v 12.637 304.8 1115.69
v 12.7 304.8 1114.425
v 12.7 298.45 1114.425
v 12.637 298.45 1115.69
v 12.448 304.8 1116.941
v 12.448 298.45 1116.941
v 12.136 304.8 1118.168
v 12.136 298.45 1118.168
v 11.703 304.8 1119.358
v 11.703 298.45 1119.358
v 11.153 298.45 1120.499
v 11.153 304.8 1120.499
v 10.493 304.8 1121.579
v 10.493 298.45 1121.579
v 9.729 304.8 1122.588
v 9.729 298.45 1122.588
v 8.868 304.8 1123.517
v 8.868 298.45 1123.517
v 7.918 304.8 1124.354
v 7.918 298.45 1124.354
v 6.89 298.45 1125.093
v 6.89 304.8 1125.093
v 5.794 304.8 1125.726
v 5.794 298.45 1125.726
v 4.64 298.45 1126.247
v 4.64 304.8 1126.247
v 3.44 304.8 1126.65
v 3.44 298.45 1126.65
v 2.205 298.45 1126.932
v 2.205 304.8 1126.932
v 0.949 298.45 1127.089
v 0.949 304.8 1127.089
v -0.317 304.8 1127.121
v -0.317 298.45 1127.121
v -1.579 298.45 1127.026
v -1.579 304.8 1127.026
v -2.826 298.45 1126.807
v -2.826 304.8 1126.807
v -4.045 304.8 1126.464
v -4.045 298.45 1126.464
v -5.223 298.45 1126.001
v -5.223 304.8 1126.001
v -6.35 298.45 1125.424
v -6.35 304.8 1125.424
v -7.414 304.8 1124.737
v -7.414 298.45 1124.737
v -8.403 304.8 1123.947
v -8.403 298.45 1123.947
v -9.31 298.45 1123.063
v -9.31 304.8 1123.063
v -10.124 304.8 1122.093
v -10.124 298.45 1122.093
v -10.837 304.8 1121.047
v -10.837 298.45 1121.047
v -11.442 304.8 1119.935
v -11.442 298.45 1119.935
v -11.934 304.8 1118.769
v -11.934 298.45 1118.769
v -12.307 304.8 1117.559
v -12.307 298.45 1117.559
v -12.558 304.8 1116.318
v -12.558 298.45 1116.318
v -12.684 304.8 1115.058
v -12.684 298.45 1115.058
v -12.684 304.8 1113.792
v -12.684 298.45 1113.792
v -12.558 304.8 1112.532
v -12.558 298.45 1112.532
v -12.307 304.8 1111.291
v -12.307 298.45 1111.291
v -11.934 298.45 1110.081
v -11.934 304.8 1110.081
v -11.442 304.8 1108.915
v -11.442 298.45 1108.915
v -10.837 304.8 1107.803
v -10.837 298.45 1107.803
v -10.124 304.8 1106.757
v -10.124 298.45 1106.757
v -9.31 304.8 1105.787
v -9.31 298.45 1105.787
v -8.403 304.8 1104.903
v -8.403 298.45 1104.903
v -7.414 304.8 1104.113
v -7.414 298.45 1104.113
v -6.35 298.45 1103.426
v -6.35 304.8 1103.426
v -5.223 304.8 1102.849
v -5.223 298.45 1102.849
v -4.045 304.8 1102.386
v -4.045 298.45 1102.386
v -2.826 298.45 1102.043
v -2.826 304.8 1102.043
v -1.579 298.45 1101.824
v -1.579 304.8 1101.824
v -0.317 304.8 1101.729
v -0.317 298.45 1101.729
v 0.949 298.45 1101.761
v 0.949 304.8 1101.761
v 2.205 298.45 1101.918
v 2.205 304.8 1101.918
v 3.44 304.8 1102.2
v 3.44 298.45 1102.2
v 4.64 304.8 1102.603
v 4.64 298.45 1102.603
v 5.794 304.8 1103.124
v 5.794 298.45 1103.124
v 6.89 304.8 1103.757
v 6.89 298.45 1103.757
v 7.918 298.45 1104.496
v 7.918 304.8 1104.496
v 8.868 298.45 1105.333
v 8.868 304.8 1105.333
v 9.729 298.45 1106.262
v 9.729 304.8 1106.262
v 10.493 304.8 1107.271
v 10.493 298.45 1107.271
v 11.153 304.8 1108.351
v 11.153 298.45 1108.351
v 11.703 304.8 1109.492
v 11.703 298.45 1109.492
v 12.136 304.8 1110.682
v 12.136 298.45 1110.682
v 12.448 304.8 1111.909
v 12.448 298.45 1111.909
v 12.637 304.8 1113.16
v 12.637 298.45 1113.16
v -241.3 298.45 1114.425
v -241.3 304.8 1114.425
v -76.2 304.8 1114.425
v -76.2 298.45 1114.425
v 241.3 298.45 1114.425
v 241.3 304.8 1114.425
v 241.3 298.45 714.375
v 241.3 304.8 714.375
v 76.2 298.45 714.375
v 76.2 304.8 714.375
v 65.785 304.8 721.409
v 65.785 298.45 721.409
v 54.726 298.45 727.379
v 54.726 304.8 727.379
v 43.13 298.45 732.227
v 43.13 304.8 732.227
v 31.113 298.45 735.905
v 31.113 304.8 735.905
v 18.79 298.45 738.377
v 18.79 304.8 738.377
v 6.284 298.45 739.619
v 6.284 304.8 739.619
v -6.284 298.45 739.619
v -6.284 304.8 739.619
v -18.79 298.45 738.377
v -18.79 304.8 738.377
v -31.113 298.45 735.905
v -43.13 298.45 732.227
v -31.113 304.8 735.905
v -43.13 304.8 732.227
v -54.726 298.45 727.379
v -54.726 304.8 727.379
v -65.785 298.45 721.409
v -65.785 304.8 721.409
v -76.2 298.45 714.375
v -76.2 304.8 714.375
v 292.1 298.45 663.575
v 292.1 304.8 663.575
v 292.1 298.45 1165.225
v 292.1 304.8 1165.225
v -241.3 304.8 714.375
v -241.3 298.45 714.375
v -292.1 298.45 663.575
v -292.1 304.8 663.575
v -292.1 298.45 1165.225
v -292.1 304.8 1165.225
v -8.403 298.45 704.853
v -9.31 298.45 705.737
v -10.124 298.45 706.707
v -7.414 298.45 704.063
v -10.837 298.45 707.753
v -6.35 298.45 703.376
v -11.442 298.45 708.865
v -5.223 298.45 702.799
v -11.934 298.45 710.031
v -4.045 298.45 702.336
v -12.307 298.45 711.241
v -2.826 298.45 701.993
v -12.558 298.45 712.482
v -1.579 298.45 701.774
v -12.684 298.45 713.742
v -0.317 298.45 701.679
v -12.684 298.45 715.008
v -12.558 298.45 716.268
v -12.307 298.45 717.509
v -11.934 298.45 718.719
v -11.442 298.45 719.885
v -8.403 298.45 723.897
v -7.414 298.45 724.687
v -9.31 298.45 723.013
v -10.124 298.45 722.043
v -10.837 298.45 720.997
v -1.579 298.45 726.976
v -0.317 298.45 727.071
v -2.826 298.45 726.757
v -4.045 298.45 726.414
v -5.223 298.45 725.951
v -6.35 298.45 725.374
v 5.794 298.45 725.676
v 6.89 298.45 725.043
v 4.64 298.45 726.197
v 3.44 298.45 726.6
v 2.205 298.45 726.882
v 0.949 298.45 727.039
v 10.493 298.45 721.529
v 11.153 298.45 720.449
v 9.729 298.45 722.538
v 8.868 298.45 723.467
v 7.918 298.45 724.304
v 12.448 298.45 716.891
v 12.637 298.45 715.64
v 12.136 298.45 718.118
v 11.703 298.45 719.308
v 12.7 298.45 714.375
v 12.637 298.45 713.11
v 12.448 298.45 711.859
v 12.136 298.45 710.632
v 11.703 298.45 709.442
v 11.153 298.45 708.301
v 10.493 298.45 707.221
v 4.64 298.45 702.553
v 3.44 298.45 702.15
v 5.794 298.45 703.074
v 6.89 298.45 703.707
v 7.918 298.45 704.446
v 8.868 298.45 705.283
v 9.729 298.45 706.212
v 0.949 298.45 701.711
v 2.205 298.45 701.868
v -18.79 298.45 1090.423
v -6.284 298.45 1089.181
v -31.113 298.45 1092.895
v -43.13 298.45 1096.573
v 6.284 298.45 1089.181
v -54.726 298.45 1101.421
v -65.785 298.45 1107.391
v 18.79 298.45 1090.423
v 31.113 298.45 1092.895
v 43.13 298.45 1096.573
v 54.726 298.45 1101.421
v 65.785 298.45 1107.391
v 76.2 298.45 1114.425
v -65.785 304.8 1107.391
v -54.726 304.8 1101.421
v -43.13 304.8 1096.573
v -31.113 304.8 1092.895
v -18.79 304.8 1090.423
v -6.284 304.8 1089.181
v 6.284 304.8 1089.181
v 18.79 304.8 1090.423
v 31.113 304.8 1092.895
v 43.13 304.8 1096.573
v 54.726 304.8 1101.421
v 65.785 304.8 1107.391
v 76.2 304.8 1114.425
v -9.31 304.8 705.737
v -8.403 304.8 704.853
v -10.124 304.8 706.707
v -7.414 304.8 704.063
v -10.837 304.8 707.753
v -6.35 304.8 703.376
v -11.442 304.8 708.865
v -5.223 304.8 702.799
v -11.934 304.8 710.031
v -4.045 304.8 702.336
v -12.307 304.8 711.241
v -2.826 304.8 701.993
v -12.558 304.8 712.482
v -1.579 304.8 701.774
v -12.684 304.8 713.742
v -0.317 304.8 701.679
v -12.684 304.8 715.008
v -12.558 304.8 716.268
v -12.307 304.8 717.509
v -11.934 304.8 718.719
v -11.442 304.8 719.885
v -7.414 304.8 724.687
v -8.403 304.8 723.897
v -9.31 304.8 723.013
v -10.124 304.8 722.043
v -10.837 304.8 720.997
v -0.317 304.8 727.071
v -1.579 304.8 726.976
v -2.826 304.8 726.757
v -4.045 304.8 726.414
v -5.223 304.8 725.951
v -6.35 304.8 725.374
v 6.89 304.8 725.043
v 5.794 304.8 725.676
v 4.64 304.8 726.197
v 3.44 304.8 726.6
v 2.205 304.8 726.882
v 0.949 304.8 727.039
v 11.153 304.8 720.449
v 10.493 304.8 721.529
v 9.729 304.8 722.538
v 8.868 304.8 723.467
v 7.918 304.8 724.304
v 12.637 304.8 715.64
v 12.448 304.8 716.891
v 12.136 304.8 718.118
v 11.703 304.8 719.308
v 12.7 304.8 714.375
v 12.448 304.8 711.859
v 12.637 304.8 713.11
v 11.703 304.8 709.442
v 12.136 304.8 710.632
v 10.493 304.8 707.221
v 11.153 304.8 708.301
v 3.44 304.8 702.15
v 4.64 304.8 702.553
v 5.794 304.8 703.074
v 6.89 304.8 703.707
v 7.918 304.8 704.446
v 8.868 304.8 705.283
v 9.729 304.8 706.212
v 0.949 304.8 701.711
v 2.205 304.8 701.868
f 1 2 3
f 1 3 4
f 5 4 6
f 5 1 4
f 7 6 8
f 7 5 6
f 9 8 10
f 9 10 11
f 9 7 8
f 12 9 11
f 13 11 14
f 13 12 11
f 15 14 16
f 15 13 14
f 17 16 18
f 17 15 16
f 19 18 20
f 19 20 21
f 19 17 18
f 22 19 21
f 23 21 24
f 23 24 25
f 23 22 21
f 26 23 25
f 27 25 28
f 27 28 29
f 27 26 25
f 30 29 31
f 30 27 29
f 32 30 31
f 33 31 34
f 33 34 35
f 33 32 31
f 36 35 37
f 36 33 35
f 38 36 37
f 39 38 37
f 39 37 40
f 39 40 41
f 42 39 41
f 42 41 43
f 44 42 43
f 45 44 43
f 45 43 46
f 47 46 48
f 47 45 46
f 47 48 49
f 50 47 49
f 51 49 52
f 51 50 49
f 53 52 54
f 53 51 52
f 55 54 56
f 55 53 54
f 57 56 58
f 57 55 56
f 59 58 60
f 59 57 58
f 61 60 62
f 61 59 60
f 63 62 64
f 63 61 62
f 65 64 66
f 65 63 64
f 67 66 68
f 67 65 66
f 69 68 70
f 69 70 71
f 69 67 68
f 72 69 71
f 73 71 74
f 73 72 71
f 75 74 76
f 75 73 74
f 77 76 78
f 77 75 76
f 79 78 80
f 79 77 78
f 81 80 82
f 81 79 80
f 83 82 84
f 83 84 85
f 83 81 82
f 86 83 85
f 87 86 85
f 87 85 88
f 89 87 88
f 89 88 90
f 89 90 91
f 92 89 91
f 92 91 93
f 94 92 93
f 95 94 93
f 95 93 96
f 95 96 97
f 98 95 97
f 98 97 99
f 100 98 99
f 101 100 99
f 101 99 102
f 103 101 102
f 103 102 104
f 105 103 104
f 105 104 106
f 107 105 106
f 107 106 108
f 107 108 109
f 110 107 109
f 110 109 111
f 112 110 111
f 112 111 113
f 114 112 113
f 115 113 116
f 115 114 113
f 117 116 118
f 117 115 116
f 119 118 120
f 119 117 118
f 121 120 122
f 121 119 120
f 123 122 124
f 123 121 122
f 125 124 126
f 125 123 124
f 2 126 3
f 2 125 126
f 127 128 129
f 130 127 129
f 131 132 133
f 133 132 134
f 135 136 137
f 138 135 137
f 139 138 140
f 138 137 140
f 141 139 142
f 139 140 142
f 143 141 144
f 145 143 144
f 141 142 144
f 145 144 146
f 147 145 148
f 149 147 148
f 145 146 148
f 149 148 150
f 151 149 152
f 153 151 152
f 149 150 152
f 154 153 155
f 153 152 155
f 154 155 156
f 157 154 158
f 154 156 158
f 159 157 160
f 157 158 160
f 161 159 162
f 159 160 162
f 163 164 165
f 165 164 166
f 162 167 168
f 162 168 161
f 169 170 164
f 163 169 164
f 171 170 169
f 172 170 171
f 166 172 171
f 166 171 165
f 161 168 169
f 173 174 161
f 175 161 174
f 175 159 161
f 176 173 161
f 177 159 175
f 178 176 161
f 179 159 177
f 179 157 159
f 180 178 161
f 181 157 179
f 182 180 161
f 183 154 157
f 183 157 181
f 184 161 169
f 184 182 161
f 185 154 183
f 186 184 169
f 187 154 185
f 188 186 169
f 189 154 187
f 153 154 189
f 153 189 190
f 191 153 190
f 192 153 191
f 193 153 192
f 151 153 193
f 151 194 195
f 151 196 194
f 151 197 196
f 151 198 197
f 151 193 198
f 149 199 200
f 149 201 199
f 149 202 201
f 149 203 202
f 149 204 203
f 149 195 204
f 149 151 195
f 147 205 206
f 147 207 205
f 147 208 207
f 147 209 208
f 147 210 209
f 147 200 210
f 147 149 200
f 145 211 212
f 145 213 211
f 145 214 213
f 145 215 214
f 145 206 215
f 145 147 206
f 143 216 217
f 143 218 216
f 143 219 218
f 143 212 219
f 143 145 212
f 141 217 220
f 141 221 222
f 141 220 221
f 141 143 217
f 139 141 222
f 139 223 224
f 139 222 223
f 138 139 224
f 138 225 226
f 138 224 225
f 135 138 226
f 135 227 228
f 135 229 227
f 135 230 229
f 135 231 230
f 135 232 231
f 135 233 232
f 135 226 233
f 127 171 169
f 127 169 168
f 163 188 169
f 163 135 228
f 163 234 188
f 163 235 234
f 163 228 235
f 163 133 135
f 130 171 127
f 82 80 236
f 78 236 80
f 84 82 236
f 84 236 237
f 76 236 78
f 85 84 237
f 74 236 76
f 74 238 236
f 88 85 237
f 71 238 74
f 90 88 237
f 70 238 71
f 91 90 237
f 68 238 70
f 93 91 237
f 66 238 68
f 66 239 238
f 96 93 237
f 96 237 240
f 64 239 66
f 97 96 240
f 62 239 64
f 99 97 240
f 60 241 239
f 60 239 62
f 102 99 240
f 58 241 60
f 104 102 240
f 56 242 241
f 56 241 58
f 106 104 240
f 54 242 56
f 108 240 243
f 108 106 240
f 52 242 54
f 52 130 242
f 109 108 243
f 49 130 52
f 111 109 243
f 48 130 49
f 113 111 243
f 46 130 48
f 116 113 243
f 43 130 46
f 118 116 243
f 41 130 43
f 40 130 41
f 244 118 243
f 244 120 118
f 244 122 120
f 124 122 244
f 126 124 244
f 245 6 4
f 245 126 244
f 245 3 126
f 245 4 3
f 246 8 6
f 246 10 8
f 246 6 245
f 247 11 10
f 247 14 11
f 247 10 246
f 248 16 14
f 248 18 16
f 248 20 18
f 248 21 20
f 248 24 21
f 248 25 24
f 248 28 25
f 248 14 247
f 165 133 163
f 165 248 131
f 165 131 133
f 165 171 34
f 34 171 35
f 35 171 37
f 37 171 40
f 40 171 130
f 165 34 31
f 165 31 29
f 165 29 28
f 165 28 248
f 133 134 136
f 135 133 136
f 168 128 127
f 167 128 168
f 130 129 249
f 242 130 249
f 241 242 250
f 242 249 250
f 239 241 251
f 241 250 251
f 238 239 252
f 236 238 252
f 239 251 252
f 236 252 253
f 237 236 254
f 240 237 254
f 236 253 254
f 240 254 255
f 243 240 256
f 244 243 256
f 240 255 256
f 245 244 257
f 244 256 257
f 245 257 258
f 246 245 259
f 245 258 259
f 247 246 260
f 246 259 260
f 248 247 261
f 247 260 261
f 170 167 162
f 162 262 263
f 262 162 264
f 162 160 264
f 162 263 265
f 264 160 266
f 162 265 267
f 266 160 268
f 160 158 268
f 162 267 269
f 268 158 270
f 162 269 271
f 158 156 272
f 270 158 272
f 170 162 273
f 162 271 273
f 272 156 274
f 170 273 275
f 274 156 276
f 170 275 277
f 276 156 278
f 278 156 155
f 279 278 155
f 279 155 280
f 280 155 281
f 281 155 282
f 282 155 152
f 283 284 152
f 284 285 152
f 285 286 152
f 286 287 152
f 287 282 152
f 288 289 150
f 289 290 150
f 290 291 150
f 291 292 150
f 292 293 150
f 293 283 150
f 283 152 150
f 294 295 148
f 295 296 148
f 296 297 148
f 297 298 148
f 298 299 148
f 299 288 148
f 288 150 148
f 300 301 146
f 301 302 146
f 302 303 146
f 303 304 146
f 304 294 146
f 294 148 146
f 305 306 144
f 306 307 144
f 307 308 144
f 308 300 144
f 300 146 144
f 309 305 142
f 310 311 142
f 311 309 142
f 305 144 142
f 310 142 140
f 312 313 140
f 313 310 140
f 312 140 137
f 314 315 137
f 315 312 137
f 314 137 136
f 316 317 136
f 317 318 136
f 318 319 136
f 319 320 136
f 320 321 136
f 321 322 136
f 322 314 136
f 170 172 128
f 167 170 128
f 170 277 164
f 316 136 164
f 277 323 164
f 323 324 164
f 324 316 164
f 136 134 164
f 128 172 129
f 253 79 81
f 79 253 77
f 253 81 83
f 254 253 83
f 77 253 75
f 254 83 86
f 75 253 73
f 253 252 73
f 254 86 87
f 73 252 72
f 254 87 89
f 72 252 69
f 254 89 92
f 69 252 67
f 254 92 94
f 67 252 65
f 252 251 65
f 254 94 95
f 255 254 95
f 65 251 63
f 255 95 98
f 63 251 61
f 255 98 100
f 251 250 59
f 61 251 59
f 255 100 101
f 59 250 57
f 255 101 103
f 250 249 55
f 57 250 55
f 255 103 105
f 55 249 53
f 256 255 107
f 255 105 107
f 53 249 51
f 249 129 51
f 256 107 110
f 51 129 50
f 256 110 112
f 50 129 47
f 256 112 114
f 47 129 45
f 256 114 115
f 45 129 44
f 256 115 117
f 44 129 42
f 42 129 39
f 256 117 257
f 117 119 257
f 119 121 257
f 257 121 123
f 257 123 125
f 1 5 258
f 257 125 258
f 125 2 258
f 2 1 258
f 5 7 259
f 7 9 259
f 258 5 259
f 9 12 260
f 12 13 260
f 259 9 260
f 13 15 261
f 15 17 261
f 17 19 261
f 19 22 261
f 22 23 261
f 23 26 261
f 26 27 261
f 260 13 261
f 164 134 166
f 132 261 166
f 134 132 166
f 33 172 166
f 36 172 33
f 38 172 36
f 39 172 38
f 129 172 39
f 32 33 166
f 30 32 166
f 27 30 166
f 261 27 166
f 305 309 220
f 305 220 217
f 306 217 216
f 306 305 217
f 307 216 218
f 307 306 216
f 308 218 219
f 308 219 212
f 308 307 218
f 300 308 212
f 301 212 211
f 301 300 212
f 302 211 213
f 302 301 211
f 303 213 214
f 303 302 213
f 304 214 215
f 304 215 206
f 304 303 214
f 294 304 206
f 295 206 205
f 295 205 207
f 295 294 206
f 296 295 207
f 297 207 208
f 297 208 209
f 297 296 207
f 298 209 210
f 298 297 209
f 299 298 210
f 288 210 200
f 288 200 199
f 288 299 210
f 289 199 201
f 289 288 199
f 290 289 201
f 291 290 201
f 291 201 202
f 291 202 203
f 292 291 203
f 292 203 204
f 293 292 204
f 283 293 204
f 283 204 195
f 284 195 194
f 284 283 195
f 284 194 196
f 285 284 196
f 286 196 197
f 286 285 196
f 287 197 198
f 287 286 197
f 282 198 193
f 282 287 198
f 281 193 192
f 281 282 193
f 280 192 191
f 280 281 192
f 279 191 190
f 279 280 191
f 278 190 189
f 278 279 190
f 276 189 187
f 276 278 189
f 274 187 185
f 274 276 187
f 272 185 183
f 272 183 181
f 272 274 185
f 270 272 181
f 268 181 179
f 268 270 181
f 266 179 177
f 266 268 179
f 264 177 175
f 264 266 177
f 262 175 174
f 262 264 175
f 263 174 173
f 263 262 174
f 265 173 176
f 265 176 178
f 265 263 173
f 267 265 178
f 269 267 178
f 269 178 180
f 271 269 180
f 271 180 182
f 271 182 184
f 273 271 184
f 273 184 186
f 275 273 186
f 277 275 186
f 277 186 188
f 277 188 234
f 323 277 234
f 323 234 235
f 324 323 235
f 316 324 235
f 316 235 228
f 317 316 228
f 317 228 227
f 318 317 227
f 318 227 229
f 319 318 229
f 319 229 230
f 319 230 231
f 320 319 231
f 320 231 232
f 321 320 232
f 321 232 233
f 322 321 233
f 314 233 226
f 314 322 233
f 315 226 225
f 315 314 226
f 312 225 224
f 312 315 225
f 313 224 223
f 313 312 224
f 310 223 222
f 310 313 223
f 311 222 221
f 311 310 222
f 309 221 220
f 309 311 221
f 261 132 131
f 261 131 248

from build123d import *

# Parameters (mm, degrees)
SKETCH002_W  = 584.2
SKETCH002_H  = 501.65
SKETCH002_R  = 12.7
PAD008_DEPTH = 6.35


with BuildPart() as part:
    # Sketch002 → Pad008 (new body)
    with BuildSketch(Plane(origin=(0, 304.8, 914.4), x_dir=(1, 0, 0), z_dir=(0, -1, 0))):
        Rectangle(SKETCH002_W, SKETCH002_H)
        with Locations((0, 200.025)):
            Circle(SKETCH002_R, mode=Mode.SUBTRACT)
        with Locations((0, -200.025)):
            Circle(SKETCH002_R, mode=Mode.SUBTRACT)
        with BuildLine():
            Line((-241.3, 200.025), (-241.3, -200.025))
            Line((-241.3, -200.025), (-76.2, -200.025))
            ThreePointArc((76.2, -200.025), (0, -174.625), (-76.2, -200.025))
            Line((241.3, -200.025), (76.2, -200.025))
            Line((241.3, 200.025), (241.3, -200.025))
            Line((241.3, 200.025), (76.2, 200.025))
            ThreePointArc((-76.2, 200.025), (0, 174.625), (76.2, 200.025))
            Line((-241.3, 200.025), (-76.2, 200.025))
        make_face(mode=Mode.SUBTRACT)
    extrude(amount=PAD008_DEPTH)


solid = part.part
